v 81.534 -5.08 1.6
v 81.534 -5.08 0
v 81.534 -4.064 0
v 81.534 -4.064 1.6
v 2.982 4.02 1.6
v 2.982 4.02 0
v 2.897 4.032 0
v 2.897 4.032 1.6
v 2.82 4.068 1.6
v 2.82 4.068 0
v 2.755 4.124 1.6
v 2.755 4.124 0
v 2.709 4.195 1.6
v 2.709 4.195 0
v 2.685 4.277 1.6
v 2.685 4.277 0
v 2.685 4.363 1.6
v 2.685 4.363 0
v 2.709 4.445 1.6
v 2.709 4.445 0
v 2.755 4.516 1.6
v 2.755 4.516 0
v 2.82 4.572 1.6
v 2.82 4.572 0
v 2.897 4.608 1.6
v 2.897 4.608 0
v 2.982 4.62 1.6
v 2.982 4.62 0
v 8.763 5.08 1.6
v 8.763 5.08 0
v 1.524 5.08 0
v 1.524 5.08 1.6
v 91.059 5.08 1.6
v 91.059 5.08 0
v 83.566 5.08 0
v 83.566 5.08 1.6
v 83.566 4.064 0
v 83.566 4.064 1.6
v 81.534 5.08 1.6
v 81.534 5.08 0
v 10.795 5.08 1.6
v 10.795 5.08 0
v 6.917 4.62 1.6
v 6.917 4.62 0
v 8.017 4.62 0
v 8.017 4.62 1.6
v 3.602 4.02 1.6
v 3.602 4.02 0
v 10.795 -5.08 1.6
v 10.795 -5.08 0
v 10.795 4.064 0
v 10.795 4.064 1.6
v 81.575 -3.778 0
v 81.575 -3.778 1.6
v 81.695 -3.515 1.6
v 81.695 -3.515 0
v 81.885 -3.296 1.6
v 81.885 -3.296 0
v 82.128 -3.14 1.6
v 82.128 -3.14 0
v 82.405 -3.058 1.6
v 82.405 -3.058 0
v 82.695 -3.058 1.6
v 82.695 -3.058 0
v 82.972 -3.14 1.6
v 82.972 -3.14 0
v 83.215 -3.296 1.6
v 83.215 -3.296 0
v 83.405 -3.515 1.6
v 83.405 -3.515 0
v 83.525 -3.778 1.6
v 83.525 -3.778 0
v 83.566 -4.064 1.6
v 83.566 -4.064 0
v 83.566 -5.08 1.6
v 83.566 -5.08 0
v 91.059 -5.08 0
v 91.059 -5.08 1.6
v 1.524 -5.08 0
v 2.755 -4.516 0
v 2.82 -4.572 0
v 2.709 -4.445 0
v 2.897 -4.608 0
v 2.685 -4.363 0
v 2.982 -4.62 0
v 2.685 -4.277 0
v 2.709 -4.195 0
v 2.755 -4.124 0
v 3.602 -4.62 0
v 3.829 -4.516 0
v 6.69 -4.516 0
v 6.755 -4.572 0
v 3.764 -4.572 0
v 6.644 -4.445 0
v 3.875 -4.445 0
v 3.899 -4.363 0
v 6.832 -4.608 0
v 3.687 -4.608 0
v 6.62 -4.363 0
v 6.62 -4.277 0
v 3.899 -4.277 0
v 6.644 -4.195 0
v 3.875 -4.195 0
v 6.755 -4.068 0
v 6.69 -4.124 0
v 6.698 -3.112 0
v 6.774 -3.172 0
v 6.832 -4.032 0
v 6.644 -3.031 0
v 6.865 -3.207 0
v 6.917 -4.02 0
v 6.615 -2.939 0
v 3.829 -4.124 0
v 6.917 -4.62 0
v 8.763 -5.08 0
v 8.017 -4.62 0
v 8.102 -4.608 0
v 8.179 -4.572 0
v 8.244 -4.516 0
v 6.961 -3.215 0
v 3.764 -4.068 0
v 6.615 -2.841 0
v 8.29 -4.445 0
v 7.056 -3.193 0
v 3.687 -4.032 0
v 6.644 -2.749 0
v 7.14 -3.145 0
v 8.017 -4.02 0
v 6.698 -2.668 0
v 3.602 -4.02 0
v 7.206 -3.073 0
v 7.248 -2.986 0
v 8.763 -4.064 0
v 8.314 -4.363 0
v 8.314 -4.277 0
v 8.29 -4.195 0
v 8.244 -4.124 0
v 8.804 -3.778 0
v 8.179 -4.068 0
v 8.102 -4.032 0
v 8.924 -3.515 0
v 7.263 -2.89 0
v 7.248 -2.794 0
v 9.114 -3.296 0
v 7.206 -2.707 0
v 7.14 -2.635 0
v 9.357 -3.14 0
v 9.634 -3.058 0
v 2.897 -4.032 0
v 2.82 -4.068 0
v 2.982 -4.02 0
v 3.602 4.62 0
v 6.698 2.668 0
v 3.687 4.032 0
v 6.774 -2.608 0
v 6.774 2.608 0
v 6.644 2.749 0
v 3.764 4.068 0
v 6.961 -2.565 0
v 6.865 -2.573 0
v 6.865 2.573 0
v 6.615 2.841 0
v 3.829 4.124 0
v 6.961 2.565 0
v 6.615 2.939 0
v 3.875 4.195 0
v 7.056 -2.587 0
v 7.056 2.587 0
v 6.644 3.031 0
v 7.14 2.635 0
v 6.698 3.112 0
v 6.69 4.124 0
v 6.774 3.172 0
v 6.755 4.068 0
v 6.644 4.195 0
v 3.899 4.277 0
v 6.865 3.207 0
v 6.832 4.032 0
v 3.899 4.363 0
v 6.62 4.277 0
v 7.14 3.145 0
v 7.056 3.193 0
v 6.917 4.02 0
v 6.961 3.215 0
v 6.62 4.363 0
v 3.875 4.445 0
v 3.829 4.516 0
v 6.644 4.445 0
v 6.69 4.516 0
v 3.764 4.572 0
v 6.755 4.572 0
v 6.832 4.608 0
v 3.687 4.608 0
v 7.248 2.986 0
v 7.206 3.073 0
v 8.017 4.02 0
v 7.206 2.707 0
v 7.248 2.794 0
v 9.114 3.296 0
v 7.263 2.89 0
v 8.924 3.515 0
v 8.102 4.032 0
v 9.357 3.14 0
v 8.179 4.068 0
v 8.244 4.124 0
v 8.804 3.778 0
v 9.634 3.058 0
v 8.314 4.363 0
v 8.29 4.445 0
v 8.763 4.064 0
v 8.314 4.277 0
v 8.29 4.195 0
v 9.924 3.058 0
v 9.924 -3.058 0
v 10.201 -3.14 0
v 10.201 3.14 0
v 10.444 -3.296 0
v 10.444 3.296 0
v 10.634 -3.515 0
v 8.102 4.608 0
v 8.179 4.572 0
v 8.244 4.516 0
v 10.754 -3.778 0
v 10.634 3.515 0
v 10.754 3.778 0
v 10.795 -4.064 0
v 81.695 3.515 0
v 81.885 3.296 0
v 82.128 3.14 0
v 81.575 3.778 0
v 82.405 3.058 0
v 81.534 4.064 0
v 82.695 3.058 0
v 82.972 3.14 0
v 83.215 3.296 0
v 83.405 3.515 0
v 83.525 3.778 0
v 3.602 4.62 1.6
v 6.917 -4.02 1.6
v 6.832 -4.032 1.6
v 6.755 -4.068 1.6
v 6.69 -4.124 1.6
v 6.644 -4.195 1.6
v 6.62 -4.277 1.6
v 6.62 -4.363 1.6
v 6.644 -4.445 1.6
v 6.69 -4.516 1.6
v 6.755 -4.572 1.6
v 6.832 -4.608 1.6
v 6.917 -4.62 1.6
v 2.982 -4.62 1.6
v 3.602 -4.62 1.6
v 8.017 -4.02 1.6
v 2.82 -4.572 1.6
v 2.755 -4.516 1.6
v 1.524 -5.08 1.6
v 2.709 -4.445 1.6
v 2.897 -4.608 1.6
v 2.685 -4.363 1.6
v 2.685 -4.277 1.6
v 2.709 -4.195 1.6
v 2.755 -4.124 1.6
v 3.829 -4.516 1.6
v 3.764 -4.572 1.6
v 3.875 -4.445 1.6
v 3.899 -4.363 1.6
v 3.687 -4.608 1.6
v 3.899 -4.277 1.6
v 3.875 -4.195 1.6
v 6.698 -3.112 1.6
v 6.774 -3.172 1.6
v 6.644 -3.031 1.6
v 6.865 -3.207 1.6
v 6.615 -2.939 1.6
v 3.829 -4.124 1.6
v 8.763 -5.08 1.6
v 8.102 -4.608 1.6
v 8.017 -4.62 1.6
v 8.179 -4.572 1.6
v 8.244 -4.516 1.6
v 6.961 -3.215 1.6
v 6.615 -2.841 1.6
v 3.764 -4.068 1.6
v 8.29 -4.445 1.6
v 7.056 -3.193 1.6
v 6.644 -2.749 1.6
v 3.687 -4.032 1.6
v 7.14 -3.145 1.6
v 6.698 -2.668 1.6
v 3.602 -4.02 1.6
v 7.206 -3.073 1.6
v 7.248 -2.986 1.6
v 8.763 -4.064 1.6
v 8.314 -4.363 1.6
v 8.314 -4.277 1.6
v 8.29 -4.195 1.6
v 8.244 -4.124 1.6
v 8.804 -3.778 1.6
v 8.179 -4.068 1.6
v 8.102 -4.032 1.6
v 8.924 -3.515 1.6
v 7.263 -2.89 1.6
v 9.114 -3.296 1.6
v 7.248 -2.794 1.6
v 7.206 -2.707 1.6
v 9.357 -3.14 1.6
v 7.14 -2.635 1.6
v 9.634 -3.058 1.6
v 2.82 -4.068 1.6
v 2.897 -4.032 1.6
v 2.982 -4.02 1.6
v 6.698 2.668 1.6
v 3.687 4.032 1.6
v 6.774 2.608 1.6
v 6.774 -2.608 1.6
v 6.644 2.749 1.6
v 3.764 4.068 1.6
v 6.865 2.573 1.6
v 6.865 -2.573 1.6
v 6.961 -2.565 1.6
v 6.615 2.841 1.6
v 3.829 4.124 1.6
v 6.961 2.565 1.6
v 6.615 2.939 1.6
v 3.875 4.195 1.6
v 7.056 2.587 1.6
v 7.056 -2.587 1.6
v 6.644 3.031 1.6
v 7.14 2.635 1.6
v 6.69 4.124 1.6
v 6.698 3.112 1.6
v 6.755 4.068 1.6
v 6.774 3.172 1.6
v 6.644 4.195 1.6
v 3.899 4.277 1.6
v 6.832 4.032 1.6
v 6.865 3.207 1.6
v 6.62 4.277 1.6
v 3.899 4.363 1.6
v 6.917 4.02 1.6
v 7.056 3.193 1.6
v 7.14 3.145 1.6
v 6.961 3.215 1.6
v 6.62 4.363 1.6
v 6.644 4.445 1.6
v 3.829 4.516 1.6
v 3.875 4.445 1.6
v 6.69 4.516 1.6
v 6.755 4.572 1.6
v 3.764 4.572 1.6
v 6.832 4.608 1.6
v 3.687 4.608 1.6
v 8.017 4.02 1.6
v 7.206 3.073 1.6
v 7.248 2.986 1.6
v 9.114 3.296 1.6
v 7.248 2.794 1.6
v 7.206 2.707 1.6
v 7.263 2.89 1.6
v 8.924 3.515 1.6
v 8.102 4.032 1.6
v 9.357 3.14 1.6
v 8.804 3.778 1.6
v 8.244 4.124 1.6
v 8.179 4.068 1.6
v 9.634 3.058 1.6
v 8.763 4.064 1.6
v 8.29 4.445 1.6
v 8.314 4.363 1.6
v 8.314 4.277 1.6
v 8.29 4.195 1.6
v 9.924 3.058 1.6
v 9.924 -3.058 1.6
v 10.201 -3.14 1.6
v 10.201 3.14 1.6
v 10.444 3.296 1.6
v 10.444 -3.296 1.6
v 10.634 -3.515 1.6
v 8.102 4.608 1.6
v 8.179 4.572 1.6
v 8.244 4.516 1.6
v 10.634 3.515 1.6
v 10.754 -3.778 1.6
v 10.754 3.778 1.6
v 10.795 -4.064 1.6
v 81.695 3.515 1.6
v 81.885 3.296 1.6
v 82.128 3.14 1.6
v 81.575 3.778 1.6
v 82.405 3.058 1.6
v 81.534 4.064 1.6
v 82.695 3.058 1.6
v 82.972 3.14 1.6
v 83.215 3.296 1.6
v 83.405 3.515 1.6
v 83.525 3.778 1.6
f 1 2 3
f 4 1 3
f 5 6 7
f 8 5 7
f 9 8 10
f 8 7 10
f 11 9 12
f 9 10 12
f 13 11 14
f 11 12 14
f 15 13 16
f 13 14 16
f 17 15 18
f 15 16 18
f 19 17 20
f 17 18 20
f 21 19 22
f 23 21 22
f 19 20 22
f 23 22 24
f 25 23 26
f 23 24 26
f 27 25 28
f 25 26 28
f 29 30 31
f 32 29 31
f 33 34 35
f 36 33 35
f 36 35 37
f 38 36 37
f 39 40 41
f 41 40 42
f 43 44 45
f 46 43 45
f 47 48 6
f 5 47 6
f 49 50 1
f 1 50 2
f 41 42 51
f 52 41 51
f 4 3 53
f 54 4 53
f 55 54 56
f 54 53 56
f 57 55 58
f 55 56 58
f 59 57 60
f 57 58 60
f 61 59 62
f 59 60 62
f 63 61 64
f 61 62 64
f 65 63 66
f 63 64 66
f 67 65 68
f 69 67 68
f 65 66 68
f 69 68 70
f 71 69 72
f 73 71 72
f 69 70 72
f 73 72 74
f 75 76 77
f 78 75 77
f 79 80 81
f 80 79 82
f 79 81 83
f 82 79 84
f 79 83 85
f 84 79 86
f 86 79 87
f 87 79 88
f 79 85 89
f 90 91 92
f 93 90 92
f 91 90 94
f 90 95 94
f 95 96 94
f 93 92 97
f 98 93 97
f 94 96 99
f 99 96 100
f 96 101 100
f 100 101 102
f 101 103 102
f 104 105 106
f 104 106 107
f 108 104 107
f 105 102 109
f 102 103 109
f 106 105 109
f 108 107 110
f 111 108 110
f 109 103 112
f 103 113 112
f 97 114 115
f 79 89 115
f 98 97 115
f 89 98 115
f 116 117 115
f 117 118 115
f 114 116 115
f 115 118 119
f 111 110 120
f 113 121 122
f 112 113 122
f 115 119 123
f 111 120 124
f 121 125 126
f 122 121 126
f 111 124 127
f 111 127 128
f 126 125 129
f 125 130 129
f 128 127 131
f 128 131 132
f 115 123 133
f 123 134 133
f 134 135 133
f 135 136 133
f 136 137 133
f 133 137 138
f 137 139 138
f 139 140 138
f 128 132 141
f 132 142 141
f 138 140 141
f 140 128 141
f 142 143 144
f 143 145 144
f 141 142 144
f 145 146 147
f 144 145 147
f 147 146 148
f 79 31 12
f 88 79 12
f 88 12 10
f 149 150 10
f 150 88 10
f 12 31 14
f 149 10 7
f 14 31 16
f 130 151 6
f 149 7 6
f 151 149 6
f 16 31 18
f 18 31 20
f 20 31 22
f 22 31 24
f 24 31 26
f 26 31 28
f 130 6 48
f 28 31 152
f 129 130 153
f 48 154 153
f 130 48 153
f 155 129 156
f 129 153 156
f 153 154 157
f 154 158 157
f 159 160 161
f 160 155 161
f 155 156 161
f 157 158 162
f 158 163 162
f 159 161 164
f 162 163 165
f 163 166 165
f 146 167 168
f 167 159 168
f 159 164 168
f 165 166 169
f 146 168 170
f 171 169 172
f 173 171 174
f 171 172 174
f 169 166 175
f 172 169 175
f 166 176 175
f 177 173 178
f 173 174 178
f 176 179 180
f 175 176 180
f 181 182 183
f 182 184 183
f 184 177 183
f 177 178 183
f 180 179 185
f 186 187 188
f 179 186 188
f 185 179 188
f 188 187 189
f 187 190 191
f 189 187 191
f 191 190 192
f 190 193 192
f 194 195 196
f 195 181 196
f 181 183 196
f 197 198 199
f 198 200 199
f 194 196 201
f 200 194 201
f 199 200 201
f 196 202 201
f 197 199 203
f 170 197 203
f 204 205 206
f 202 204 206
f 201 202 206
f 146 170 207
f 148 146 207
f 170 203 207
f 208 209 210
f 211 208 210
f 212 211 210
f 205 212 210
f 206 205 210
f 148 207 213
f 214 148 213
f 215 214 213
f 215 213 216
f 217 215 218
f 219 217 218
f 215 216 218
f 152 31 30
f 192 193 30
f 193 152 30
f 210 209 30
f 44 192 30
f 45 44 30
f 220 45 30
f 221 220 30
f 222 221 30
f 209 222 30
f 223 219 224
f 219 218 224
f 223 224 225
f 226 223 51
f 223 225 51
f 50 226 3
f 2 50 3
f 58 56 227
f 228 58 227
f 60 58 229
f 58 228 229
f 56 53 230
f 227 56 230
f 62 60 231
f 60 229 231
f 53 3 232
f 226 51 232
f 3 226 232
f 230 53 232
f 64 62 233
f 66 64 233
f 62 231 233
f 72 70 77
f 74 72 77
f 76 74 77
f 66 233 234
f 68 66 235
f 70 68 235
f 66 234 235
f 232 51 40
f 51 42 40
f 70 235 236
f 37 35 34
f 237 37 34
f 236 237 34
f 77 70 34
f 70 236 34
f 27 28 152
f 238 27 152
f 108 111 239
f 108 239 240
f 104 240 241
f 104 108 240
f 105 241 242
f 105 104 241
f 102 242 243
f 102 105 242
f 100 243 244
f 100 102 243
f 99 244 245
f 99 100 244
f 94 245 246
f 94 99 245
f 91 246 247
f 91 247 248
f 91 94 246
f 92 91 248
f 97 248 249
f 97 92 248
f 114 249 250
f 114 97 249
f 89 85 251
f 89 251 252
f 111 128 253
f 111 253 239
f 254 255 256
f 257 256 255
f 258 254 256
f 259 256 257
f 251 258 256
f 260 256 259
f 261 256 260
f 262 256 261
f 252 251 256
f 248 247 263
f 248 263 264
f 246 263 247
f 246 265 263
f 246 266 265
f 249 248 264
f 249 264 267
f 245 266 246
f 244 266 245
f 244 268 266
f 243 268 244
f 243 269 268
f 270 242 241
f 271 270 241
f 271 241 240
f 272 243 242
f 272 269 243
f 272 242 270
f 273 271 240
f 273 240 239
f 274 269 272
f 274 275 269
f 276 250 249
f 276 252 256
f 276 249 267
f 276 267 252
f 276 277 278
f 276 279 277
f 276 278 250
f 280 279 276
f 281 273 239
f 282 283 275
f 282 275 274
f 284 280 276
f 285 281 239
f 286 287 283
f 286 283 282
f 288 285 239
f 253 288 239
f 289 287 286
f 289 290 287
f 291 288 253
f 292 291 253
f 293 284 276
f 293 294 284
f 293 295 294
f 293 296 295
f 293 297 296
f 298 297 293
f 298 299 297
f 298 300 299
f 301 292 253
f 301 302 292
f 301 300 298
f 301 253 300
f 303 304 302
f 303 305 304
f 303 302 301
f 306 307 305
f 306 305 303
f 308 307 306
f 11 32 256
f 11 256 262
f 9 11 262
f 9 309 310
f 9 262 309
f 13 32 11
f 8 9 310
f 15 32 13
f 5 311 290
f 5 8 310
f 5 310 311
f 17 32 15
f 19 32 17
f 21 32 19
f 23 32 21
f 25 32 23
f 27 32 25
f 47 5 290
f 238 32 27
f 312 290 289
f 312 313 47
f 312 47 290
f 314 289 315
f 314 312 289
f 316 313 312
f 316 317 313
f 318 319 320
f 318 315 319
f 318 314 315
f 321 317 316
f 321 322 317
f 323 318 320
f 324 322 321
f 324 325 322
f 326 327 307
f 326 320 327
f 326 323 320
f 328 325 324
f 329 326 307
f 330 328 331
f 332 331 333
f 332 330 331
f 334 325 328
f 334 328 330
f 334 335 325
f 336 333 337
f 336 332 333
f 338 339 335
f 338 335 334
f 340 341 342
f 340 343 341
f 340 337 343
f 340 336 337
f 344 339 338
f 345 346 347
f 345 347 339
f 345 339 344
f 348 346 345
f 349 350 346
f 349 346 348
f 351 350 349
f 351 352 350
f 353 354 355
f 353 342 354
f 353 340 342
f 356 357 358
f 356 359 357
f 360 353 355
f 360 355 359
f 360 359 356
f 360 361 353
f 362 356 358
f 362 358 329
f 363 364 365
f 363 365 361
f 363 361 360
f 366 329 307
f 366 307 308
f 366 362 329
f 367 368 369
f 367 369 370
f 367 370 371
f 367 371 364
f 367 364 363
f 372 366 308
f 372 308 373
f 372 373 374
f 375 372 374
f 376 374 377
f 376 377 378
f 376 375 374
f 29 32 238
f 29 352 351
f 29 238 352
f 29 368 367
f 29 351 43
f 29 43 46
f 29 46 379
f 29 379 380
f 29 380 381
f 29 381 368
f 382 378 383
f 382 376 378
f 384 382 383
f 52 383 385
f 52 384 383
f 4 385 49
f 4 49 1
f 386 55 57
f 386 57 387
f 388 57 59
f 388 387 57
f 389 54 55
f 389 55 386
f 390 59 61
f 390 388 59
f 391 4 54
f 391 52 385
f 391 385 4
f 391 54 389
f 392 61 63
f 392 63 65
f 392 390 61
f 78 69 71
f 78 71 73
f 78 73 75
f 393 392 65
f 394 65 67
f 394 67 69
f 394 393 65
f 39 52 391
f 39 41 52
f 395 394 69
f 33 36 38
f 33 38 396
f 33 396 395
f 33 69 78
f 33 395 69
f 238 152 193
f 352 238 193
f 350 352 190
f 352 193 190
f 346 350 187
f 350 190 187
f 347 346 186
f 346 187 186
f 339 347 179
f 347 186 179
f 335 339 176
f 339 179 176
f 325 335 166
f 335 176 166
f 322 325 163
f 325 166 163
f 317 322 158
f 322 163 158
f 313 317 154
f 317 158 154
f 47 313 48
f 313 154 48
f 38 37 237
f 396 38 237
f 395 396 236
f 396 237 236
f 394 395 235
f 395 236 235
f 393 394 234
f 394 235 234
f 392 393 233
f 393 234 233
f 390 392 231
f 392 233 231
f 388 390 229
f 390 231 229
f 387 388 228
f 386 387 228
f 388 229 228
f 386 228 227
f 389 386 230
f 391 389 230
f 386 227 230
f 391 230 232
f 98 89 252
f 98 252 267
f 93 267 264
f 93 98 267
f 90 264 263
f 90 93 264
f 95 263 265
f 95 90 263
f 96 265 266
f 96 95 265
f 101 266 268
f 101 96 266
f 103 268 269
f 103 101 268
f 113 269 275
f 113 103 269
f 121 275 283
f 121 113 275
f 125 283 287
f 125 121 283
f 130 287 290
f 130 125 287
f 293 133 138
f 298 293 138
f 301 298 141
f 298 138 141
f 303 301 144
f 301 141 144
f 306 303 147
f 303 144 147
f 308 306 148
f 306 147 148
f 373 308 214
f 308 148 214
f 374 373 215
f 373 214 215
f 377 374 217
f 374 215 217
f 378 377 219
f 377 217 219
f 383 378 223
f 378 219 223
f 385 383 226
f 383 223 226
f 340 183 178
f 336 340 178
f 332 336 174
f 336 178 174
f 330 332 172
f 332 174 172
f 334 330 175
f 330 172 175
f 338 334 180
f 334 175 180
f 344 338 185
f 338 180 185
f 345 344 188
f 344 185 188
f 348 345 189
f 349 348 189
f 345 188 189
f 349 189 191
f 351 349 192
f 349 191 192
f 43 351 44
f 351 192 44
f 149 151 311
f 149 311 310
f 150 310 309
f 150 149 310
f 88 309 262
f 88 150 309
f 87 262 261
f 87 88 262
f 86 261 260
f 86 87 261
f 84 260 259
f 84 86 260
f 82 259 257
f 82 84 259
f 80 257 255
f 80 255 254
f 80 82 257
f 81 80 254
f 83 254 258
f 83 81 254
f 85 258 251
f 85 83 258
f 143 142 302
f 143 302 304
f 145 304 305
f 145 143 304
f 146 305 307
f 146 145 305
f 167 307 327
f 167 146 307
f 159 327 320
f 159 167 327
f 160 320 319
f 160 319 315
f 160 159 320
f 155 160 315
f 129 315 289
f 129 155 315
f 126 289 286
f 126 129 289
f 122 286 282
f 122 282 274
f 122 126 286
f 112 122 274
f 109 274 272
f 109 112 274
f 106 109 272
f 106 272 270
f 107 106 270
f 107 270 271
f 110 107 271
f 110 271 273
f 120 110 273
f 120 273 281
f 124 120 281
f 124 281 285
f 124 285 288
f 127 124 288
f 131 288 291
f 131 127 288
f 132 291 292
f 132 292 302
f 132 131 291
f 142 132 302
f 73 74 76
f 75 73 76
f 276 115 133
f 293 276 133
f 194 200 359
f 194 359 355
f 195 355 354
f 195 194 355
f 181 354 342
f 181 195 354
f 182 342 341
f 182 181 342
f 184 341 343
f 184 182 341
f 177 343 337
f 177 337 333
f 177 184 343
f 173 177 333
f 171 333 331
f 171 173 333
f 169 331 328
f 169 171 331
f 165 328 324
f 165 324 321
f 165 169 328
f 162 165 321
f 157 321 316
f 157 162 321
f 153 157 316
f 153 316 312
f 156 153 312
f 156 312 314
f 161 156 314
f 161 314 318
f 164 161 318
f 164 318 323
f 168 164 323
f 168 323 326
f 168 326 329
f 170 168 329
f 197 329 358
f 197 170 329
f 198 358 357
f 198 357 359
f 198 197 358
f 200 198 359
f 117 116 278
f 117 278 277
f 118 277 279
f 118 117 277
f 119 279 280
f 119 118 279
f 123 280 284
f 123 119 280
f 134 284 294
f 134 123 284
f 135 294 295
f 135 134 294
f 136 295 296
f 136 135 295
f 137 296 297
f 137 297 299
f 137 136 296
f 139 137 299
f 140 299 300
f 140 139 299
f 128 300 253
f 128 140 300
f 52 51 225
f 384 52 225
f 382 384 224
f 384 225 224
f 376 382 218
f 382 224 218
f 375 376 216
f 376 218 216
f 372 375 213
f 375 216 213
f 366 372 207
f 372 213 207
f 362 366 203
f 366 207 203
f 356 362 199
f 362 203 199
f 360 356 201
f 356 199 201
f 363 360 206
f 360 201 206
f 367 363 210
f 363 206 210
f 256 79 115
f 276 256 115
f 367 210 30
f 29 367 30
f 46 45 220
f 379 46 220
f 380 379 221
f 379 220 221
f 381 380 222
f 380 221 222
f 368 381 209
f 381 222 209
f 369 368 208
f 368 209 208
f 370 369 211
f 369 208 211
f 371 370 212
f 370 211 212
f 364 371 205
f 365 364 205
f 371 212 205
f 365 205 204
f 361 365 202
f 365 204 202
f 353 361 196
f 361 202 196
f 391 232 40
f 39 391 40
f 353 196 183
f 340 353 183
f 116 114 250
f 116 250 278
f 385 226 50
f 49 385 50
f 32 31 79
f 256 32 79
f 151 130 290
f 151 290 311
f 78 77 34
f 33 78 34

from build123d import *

# Parameters (mm, degrees)
SKETCH_2_R      = 0.325658607
EXTRUDE_1_DEPTH = 1.6


with BuildPart() as part:
    # 草图2 → 凸台-拉伸1 (new body)
    with BuildSketch(Plane.XY):
        with BuildLine():
            Line((1.524, 5.08), (1.524, -5.08))
            Line((1.524, -5.08), (8.763, -5.08))
            Line((8.763, -5.08), (8.763, -4.064))
            ThreePointArc((8.763, -4.064), (9.779, -3.048), (10.795, -4.064))
            Line((10.795, -4.064), (10.795, -5.08))
            Line((10.795, -5.08), (81.534, -5.08))
            Line((81.534, -5.08), (81.534, -4.064))
            ThreePointArc((81.534, -4.064), (82.55, -3.048), (83.566, -4.064))
            Line((83.566, -4.064), (83.566, -5.08))
            Line((83.566, -5.08), (91.059, -5.08))
            Line((91.059, -5.08), (91.059, 5.08))
            Line((91.059, 5.08), (83.566, 5.08))
            Line((83.566, 5.08), (83.566, 4.064))
            ThreePointArc((83.566, 4.064), (82.55, 3.048), (81.534, 4.064))
            Line((81.534, 4.064), (81.534, 5.08))
            Line((81.534, 5.08), (10.795, 5.08))
            Line((10.795, 5.08), (10.795, 4.064))
            ThreePointArc((10.795, 4.064), (9.779, 3.048), (8.763, 4.064))
            Line((8.763, 4.064), (8.763, 5.08))
            Line((8.763, 5.08), (1.524, 5.08))
        make_face()
        with Locations((6.937038713, 2.89)):
            Circle(SKETCH_2_R, mode=Mode.SUBTRACT)
        with Locations((6.937038713, -2.89)):
            Circle(SKETCH_2_R, mode=Mode.SUBTRACT)
        with BuildLine():
            Line((2.982, 4.62), (3.602, 4.62))
            ThreePointArc((3.602, 4.62), (3.902, 4.32), (3.602, 4.02))
            Line((3.602, 4.02), (2.982, 4.02))
            ThreePointArc((2.982, 4.02), (2.682, 4.32), (2.982, 4.62))
        make_face(mode=Mode.SUBTRACT)
        with BuildLine():
            Line((6.917, 4.62), (8.017, 4.62))
            ThreePointArc((8.017, 4.62), (8.317, 4.32), (8.017, 4.02))
            Line((8.017, 4.02), (6.917, 4.02))
            ThreePointArc((6.917, 4.02), (6.617, 4.32), (6.917, 4.62))
        make_face(mode=Mode.SUBTRACT)
        with BuildLine():
            Line((8.017, -4.02), (6.917, -4.02))
            ThreePointArc((6.917, -4.02), (6.617, -4.32), (6.917, -4.62))
            Line((6.917, -4.62), (8.017, -4.62))
            ThreePointArc((8.017, -4.62), (8.317, -4.32), (8.017, -4.02))
        make_face(mode=Mode.SUBTRACT)
        with BuildLine():
            Line((3.602, -4.02), (2.982, -4.02))
            ThreePointArc((2.982, -4.02), (2.682, -4.32), (2.982, -4.62))
            Line((2.982, -4.62), (3.602, -4.62))
            ThreePointArc((3.602, -4.62), (3.902, -4.32), (3.602, -4.02))
        make_face(mode=Mode.SUBTRACT)
    extrude(amount=EXTRUDE_1_DEPTH)


solid = part.part
